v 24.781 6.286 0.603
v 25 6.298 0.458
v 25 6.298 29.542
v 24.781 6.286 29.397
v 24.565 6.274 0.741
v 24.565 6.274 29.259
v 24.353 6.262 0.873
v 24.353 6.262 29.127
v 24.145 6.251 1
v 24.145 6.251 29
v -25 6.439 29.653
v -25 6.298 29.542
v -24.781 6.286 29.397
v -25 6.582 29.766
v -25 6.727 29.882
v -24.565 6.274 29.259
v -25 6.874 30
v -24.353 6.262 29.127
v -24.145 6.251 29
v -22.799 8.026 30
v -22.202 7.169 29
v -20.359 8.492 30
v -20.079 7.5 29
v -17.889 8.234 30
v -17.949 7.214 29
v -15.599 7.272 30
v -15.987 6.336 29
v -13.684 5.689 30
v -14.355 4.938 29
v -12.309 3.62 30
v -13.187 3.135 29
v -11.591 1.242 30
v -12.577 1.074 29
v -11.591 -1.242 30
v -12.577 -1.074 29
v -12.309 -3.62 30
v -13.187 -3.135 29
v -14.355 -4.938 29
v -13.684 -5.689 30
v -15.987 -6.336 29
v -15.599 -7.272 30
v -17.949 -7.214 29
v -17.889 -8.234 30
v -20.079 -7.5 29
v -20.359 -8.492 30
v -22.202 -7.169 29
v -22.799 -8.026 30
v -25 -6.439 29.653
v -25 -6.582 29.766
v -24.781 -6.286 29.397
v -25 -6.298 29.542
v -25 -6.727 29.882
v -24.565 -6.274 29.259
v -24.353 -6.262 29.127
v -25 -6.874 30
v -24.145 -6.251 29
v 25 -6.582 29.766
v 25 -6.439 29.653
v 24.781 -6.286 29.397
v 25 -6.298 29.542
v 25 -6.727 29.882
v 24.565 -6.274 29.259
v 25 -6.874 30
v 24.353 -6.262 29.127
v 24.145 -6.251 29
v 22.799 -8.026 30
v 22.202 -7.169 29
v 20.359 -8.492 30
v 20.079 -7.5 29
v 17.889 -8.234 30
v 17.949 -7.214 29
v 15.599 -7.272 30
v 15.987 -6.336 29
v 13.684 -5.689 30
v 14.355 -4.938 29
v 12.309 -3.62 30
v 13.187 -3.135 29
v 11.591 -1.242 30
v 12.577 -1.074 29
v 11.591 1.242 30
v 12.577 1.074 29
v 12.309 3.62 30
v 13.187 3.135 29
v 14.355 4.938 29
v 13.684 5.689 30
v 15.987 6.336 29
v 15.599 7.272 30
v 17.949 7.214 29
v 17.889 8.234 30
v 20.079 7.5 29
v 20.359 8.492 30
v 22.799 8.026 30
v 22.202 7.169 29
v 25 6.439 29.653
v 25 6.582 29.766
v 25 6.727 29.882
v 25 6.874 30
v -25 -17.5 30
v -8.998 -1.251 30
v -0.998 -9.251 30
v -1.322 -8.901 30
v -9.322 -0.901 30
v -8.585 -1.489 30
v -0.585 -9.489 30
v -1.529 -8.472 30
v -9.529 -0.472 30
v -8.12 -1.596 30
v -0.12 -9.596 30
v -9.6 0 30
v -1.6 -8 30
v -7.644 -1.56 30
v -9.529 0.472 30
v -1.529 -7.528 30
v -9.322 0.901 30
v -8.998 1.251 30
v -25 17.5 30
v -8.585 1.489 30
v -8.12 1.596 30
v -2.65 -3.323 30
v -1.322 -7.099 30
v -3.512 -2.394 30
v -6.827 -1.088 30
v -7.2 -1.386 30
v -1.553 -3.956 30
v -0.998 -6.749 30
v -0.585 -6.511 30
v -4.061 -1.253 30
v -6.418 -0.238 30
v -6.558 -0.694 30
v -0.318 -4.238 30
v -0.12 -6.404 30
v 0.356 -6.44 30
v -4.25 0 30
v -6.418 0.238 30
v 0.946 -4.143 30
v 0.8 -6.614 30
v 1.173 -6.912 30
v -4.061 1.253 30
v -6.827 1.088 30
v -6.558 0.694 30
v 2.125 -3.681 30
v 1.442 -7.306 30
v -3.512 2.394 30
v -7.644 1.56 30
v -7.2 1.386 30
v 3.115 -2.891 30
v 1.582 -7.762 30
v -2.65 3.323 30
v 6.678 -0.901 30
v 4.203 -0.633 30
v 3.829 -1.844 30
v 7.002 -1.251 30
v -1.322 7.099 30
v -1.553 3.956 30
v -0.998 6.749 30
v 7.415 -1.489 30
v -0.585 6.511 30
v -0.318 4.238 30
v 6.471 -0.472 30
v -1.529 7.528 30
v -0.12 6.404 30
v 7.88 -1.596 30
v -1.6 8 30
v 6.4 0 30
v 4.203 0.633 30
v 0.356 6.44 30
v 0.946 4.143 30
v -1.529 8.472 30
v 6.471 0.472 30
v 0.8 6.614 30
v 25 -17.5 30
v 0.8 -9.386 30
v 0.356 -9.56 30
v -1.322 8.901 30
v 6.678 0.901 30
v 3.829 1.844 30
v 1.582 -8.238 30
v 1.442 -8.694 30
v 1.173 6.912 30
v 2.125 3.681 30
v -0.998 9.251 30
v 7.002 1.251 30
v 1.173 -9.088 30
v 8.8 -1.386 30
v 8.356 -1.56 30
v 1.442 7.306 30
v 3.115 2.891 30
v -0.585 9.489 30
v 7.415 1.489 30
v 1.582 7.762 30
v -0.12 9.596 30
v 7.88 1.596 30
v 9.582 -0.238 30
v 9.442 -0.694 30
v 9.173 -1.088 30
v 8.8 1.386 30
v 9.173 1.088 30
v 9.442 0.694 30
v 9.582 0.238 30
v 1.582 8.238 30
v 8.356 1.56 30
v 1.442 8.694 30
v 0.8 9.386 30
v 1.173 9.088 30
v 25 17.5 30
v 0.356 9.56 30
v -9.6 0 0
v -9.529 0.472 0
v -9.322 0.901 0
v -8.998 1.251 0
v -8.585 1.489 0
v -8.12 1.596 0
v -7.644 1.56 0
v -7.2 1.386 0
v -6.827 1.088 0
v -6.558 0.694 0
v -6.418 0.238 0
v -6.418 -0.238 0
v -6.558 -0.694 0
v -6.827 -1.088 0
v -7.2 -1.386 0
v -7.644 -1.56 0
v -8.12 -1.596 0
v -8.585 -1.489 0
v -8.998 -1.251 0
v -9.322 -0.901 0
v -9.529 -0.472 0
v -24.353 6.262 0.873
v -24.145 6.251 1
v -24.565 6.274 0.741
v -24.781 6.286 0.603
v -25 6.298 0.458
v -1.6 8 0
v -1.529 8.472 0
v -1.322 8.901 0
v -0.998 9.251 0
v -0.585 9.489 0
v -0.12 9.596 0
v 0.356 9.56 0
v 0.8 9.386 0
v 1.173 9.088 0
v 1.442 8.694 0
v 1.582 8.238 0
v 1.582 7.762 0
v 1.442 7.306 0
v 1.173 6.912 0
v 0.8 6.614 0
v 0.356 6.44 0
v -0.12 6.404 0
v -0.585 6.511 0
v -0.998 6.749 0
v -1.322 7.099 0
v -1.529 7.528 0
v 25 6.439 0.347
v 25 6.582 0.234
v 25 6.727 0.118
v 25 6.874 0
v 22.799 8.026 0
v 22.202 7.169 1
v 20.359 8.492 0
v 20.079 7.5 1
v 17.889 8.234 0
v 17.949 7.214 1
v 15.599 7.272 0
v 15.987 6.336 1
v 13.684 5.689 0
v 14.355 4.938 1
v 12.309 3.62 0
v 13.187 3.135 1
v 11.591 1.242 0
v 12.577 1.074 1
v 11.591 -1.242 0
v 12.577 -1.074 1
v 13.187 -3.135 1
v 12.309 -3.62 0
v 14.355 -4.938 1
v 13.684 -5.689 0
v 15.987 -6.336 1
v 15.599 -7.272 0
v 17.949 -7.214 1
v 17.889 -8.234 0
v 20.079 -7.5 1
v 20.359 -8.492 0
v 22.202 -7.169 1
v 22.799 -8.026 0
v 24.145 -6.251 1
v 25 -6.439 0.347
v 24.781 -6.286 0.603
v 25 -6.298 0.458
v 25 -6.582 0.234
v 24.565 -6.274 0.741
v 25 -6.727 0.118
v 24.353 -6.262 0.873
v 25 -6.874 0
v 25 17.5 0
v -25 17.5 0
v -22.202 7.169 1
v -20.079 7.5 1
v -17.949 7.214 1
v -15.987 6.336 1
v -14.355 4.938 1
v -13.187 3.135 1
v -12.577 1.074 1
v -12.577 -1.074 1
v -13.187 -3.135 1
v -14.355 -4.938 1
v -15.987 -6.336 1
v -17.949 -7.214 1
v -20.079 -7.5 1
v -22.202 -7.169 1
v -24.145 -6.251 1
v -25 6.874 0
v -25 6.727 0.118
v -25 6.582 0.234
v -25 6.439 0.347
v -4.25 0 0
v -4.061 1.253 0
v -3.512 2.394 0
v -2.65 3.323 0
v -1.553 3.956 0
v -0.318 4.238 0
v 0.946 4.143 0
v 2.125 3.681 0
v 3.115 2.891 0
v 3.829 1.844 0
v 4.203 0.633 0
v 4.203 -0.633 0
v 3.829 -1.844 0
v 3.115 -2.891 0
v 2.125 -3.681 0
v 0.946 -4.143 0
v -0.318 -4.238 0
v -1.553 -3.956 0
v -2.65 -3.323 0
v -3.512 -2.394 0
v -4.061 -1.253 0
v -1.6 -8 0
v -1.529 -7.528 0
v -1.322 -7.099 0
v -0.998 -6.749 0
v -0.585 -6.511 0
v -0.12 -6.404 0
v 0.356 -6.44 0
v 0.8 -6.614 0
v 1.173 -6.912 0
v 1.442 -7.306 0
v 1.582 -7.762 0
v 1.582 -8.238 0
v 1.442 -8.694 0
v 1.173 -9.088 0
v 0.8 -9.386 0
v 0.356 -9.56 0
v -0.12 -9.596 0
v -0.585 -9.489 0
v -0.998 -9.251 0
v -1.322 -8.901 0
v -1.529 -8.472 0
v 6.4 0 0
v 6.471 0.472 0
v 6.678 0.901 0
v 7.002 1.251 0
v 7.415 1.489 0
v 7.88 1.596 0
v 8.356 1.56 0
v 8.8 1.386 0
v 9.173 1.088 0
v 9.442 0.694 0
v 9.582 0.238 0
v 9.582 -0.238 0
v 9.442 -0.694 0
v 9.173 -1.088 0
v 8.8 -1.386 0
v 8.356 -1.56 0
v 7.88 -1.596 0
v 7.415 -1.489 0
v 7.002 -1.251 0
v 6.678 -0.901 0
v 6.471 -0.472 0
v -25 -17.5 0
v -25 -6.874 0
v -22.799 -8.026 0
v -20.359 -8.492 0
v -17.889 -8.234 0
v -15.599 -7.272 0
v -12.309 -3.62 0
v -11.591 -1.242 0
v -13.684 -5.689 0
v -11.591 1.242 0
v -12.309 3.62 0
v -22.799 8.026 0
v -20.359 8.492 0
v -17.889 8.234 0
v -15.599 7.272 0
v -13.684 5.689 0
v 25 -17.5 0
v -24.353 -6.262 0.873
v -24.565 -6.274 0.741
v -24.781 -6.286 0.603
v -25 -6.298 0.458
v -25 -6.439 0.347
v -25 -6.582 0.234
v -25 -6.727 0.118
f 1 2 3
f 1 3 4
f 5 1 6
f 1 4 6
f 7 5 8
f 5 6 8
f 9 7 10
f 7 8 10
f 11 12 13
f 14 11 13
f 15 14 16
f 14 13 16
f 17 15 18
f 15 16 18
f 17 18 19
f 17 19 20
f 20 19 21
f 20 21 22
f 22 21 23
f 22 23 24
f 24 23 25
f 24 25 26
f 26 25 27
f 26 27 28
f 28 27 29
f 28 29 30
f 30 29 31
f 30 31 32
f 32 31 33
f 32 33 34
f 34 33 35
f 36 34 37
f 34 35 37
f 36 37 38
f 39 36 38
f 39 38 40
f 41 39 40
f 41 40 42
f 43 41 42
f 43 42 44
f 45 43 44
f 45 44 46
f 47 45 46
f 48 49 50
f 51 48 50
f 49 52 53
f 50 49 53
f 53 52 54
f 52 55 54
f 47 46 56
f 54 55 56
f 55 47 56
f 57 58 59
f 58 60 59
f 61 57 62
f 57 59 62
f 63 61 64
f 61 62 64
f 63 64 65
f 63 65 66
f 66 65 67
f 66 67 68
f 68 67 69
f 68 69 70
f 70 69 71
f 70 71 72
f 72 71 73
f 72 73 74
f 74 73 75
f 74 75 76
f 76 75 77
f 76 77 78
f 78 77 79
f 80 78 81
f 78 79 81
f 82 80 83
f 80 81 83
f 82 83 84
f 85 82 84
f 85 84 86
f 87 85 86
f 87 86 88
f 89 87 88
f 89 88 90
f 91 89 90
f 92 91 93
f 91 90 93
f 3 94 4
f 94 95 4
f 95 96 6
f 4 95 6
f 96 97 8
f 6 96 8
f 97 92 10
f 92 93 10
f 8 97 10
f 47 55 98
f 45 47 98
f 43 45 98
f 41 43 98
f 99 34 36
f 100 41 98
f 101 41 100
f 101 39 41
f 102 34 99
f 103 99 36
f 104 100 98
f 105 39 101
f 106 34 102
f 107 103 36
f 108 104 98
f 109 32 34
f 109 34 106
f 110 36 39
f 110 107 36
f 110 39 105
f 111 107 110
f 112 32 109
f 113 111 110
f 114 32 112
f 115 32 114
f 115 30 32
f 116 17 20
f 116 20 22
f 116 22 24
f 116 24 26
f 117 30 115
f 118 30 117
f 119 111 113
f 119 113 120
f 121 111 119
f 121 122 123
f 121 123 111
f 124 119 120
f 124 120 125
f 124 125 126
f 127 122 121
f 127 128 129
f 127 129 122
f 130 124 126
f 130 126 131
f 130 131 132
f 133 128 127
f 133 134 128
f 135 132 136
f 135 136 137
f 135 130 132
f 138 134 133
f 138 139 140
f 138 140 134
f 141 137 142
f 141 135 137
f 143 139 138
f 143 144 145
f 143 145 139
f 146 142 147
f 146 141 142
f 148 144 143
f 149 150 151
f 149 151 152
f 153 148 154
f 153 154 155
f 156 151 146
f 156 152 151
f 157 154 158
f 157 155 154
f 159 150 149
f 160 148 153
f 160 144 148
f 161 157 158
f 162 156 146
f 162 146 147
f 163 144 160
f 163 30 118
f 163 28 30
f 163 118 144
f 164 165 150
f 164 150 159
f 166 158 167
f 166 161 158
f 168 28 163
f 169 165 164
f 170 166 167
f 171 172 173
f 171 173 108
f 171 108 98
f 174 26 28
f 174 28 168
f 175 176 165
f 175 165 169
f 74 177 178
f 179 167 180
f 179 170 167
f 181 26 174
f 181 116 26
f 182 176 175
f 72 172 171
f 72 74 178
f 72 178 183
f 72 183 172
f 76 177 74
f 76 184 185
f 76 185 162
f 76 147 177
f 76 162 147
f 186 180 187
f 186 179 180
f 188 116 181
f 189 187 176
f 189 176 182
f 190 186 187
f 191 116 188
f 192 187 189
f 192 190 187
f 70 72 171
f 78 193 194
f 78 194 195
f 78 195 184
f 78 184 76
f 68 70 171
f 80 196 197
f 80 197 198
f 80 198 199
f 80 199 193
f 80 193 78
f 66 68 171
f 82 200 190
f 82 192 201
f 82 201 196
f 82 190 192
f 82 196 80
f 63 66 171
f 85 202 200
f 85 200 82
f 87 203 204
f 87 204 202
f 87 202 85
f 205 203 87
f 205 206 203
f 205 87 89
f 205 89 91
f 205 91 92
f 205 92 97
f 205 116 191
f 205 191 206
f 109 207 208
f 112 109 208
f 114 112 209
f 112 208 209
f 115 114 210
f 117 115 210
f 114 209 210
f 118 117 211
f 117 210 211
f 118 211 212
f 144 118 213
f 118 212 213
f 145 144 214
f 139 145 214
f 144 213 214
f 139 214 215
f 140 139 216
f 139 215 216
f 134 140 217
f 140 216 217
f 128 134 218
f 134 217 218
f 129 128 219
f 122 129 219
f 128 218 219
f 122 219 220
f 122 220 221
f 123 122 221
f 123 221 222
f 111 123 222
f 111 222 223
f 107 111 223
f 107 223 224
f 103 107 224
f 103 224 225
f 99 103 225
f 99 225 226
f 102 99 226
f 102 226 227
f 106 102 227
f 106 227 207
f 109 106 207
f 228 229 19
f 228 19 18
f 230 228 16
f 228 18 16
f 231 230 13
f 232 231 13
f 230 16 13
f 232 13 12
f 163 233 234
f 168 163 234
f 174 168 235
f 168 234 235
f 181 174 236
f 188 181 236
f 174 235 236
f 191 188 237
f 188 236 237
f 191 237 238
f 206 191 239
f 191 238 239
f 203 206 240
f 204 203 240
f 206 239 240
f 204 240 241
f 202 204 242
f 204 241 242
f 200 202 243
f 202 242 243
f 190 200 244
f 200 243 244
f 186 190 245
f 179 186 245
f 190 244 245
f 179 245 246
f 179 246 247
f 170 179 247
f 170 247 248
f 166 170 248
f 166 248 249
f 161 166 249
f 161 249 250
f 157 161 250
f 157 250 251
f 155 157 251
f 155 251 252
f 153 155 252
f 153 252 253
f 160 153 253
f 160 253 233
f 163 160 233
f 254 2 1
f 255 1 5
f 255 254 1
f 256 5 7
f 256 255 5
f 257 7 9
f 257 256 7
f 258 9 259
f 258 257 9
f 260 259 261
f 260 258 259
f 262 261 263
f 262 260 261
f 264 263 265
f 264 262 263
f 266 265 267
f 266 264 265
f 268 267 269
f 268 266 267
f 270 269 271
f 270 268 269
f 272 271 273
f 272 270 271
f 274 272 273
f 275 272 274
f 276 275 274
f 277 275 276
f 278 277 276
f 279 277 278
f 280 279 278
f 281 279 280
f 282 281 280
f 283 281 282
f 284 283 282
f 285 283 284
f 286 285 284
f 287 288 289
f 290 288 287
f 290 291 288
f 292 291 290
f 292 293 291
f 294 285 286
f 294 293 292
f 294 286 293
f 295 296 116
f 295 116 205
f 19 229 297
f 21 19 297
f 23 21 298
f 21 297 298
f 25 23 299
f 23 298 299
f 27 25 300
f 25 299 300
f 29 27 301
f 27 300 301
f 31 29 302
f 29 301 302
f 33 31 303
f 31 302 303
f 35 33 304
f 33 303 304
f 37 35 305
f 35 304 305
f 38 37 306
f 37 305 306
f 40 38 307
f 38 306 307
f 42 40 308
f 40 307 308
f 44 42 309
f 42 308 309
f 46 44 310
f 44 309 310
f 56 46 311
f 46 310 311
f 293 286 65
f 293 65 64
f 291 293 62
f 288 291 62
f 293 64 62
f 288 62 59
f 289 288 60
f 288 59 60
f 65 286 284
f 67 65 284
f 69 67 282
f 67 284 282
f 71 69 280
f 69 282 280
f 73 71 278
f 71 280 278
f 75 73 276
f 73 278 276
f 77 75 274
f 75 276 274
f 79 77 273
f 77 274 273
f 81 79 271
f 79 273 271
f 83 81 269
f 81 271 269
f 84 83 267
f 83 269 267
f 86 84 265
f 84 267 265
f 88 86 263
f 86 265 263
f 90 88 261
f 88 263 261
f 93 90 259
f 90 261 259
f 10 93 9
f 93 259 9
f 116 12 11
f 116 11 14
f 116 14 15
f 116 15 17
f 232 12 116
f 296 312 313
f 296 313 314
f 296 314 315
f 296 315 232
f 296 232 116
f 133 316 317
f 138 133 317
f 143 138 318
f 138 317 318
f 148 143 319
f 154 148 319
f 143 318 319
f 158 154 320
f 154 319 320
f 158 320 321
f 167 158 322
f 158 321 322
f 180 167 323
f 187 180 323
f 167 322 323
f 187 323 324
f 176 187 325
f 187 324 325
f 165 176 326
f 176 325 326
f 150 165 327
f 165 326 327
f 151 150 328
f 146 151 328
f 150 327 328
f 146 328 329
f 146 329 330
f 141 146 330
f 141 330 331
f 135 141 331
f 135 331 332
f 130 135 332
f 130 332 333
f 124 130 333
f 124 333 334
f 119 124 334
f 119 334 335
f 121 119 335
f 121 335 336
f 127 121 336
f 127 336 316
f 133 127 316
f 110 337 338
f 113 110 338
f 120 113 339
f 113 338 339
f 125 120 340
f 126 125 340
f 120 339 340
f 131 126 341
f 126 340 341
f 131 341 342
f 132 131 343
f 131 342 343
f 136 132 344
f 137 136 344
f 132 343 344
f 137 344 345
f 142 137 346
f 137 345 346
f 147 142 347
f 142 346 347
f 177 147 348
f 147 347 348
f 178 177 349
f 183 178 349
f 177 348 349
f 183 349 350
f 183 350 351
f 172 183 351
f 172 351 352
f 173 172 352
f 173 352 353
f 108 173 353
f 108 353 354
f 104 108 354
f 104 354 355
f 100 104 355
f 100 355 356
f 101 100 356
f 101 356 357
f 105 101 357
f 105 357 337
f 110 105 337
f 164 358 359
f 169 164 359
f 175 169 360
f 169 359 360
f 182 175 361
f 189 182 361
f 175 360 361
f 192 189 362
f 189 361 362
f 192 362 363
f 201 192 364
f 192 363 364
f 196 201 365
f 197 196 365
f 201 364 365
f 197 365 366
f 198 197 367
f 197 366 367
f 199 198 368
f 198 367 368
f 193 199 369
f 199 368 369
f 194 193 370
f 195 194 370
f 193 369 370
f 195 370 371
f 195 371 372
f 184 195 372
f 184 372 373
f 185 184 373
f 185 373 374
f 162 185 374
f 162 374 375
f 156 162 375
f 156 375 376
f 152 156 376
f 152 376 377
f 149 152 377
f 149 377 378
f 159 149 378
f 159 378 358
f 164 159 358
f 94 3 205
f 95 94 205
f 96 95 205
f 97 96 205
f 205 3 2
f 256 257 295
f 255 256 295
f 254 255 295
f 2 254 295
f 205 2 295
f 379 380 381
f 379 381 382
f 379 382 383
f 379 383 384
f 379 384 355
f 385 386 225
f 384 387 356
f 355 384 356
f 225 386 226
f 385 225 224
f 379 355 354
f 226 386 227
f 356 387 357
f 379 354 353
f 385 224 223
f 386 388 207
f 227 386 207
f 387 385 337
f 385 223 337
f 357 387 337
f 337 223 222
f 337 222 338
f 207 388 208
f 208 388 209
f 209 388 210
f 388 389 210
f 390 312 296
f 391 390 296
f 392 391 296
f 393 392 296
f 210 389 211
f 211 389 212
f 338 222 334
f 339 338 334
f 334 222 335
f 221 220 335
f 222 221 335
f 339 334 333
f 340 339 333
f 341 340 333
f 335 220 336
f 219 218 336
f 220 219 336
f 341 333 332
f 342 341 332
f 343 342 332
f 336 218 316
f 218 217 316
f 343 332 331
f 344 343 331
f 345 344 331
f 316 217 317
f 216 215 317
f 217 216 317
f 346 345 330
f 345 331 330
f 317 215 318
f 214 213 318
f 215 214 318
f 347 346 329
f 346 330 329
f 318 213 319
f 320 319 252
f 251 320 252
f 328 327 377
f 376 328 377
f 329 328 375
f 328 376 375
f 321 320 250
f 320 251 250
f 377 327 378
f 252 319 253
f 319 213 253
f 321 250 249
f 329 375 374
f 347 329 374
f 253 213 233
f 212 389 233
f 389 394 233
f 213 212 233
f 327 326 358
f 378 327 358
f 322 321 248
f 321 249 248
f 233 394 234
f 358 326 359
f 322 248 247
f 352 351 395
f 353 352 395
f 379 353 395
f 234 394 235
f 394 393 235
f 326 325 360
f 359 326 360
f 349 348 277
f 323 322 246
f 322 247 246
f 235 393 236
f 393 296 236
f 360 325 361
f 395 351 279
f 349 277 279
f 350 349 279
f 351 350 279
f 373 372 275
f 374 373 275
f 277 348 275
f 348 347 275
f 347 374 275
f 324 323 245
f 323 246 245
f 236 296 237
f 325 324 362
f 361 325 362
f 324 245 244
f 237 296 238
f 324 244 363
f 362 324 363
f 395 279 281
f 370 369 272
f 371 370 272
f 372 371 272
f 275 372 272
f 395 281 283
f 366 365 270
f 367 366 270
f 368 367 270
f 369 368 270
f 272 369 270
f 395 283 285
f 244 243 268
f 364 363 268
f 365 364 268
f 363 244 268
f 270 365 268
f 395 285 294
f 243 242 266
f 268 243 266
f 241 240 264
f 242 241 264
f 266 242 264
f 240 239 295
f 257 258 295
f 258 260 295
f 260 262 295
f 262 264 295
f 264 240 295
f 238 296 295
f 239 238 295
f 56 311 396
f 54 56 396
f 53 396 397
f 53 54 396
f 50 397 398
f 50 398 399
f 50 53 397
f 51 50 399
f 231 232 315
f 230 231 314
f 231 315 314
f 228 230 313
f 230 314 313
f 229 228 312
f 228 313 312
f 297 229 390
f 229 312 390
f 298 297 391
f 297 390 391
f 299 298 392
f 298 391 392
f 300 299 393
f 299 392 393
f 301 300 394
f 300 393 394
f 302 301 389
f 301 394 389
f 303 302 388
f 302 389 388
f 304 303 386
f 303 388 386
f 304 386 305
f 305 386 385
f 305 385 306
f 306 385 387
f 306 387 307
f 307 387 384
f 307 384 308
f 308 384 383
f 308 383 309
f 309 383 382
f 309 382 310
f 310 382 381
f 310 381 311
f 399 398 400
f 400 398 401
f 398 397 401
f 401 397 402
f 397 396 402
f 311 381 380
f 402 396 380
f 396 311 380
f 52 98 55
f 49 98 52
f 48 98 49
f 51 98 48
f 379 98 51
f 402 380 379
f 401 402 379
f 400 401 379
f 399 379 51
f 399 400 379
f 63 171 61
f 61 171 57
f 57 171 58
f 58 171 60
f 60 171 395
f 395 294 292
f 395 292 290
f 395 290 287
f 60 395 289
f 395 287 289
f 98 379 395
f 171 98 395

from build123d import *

# Parameters (mm, degrees)
SKETCH_1_W        = 50
SKETCH_1_H        = 35
EXTRUDE_1_DEPTH   = 30
HOLE_WIZARD_341_D = 8.5
HOLE_WIZARD_446_D = 3.2
HOLE_WIZARD_600_D = 15
CHAMFER_1_SIZE    = 1
CHAMFER_1_SIZE_2  = 0.708203932


with BuildPart() as part:
    # 草图1 → 凸台-拉伸1 (new body)
    with BuildSketch(Plane.XY):
        Rectangle(SKETCH_1_W, SKETCH_1_H)
    extrude(amount=EXTRUDE_1_DEPTH)

    # Hole Wizard 341 (through all)
    with Locations(Plane.XY.offset(30)):
        with Locations((0, 0)):
            Hole(HOLE_WIZARD_341_D / 2)

    # Hole Wizard 446 (through all)
    with Locations(Plane.XY.offset(30)):
        with Locations((8, 0), (0, 8), (-8, 0), (0, -8)):
            Hole(HOLE_WIZARD_446_D / 2)

    # Hole Wizard 600 (through all)
    with Locations(Plane.XY.offset(30)):
        with Locations((20, 0), (-20, 0)):
            Hole(HOLE_WIZARD_600_D / 2)

    # 倒角1
    # the kernel refuses this chamfer: 1, 0.708203932 mm, written as the material it takes off along each edge
    with BuildSketch(Plane(origin=(-20, 0, 0), x_dir=(-0.8790200859122482, 0.4767847402789059, 0), z_dir=(-0.4767847402789059, -0.8790200859122482, 0))) as chamfer_1_piece_1:
        Polygon((7.5, -CHAMFER_1_SIZE), (7.5 + CHAMFER_1_SIZE, 0), (7.5, 0), align=None)
    revolve(axis=Axis((-20, 0, 0), (0, 0, -1)), revolution_arc=303.048763938, mode=Mode.SUBTRACT)
    with BuildSketch(Plane(origin=(-20, 0, 30), x_dir=(-0.879020085912248, 0.47678474027890627, 0), z_dir=(-0.47678474027890627, -0.879020085912248, 0))) as chamfer_1_piece_2:
        Polygon((7.5 + CHAMFER_1_SIZE, 0), (7.5, CHAMFER_1_SIZE), (7.5, 0), align=None)
    revolve(axis=Axis((-20, 0, 30), (0, 0, -1)), revolution_arc=303.048763938, mode=Mode.SUBTRACT)
    with BuildSketch(Plane(origin=(20, 0, 30), x_dir=(0.879020085912248, -0.4767847402789061, 0), z_dir=(0.4767847402789061, 0.879020085912248, 0))) as chamfer_1_piece_3:
        Polygon((7.5 + CHAMFER_1_SIZE, 0), (7.5, CHAMFER_1_SIZE), (7.5, 0), align=None)
    revolve(axis=Axis((20, 0, 30), (0, 0, -1)), revolution_arc=303.048763938, mode=Mode.SUBTRACT)
    with BuildSketch(Plane(origin=(20, 0, 0), x_dir=(0.8790200859122481, 0.476784740278906, 0), z_dir=(0.476784740278906, -0.8790200859122481, 0))) as chamfer_1_piece_4:
        Polygon((7.5, CHAMFER_1_SIZE), (7.5 + CHAMFER_1_SIZE, 0), (7.5, 0), align=None)
    revolve(axis=Axis((20, 0, 0), (0, 0, 1)), revolution_arc=303.048763938, mode=Mode.SUBTRACT)
    with BuildSketch(Plane(origin=(-25, 5.590169944, 32.778051389), x_dir=(0.7914486393779661, 0.611235675682274, 0), z_dir=(0, 0, -1)), Plane(origin=(25, -5.590169944, 32.778051389), x_dir=(-0.7914486393779661, -0.611235675682274, 0), z_dir=(0, 0, -1))) as chamfer_1_piece_5:
        with BuildLine():
            Line((1.080663788, 0), (CHAMFER_1_SIZE_2 * 0.611235676113, -CHAMFER_1_SIZE_2 * 0.791448639936))
            Line((CHAMFER_1_SIZE_2 * 0.611235676113, -CHAMFER_1_SIZE_2 * 0.791448639936), (0, 0))
            ThreePointArc((0, 0), (0.555522087, -0.019473843), (1.080663788, 0))
        make_face()
    extrude(amount=35.556102778, mode=Mode.SUBTRACT)
    with BuildSketch(Plane(origin=(-25, -5.590169944, 32.778051389), x_dir=(0.7914486393779665, -0.6112356756822735, 0), z_dir=(0, 0, -1))) as chamfer_1_piece_6:
        with BuildLine():
            Line((1.080663788, 0), (CHAMFER_1_SIZE_2 * 0.611235676113, CHAMFER_1_SIZE_2 * 0.791448639936))
            Line((CHAMFER_1_SIZE_2 * 0.611235676113, CHAMFER_1_SIZE_2 * 0.791448639936), (0, 0))
            ThreePointArc((0, 0), (0.555522087, 0.019473843), (1.080663788, 0))
        make_face()
    extrude(amount=35.556102778, mode=Mode.SUBTRACT)
    with BuildSketch(Plane(origin=(25, 5.590169944, 32.778051389), x_dir=(0, 1, 0), z_dir=(0, 0, -1))) as chamfer_1_piece_7:
        with BuildLine():
            Line((CHAMFER_1_SIZE_2, 0), (0.660540261, -0.855289885))
            ThreePointArc((0.660540261, -0.855289885), (0.354967464, -0.427764092), (0, 0))
            Line((0, 0), (CHAMFER_1_SIZE_2, 0))
        make_face()
    extrude(amount=35.556102778, mode=Mode.SUBTRACT)


solid = part.part
